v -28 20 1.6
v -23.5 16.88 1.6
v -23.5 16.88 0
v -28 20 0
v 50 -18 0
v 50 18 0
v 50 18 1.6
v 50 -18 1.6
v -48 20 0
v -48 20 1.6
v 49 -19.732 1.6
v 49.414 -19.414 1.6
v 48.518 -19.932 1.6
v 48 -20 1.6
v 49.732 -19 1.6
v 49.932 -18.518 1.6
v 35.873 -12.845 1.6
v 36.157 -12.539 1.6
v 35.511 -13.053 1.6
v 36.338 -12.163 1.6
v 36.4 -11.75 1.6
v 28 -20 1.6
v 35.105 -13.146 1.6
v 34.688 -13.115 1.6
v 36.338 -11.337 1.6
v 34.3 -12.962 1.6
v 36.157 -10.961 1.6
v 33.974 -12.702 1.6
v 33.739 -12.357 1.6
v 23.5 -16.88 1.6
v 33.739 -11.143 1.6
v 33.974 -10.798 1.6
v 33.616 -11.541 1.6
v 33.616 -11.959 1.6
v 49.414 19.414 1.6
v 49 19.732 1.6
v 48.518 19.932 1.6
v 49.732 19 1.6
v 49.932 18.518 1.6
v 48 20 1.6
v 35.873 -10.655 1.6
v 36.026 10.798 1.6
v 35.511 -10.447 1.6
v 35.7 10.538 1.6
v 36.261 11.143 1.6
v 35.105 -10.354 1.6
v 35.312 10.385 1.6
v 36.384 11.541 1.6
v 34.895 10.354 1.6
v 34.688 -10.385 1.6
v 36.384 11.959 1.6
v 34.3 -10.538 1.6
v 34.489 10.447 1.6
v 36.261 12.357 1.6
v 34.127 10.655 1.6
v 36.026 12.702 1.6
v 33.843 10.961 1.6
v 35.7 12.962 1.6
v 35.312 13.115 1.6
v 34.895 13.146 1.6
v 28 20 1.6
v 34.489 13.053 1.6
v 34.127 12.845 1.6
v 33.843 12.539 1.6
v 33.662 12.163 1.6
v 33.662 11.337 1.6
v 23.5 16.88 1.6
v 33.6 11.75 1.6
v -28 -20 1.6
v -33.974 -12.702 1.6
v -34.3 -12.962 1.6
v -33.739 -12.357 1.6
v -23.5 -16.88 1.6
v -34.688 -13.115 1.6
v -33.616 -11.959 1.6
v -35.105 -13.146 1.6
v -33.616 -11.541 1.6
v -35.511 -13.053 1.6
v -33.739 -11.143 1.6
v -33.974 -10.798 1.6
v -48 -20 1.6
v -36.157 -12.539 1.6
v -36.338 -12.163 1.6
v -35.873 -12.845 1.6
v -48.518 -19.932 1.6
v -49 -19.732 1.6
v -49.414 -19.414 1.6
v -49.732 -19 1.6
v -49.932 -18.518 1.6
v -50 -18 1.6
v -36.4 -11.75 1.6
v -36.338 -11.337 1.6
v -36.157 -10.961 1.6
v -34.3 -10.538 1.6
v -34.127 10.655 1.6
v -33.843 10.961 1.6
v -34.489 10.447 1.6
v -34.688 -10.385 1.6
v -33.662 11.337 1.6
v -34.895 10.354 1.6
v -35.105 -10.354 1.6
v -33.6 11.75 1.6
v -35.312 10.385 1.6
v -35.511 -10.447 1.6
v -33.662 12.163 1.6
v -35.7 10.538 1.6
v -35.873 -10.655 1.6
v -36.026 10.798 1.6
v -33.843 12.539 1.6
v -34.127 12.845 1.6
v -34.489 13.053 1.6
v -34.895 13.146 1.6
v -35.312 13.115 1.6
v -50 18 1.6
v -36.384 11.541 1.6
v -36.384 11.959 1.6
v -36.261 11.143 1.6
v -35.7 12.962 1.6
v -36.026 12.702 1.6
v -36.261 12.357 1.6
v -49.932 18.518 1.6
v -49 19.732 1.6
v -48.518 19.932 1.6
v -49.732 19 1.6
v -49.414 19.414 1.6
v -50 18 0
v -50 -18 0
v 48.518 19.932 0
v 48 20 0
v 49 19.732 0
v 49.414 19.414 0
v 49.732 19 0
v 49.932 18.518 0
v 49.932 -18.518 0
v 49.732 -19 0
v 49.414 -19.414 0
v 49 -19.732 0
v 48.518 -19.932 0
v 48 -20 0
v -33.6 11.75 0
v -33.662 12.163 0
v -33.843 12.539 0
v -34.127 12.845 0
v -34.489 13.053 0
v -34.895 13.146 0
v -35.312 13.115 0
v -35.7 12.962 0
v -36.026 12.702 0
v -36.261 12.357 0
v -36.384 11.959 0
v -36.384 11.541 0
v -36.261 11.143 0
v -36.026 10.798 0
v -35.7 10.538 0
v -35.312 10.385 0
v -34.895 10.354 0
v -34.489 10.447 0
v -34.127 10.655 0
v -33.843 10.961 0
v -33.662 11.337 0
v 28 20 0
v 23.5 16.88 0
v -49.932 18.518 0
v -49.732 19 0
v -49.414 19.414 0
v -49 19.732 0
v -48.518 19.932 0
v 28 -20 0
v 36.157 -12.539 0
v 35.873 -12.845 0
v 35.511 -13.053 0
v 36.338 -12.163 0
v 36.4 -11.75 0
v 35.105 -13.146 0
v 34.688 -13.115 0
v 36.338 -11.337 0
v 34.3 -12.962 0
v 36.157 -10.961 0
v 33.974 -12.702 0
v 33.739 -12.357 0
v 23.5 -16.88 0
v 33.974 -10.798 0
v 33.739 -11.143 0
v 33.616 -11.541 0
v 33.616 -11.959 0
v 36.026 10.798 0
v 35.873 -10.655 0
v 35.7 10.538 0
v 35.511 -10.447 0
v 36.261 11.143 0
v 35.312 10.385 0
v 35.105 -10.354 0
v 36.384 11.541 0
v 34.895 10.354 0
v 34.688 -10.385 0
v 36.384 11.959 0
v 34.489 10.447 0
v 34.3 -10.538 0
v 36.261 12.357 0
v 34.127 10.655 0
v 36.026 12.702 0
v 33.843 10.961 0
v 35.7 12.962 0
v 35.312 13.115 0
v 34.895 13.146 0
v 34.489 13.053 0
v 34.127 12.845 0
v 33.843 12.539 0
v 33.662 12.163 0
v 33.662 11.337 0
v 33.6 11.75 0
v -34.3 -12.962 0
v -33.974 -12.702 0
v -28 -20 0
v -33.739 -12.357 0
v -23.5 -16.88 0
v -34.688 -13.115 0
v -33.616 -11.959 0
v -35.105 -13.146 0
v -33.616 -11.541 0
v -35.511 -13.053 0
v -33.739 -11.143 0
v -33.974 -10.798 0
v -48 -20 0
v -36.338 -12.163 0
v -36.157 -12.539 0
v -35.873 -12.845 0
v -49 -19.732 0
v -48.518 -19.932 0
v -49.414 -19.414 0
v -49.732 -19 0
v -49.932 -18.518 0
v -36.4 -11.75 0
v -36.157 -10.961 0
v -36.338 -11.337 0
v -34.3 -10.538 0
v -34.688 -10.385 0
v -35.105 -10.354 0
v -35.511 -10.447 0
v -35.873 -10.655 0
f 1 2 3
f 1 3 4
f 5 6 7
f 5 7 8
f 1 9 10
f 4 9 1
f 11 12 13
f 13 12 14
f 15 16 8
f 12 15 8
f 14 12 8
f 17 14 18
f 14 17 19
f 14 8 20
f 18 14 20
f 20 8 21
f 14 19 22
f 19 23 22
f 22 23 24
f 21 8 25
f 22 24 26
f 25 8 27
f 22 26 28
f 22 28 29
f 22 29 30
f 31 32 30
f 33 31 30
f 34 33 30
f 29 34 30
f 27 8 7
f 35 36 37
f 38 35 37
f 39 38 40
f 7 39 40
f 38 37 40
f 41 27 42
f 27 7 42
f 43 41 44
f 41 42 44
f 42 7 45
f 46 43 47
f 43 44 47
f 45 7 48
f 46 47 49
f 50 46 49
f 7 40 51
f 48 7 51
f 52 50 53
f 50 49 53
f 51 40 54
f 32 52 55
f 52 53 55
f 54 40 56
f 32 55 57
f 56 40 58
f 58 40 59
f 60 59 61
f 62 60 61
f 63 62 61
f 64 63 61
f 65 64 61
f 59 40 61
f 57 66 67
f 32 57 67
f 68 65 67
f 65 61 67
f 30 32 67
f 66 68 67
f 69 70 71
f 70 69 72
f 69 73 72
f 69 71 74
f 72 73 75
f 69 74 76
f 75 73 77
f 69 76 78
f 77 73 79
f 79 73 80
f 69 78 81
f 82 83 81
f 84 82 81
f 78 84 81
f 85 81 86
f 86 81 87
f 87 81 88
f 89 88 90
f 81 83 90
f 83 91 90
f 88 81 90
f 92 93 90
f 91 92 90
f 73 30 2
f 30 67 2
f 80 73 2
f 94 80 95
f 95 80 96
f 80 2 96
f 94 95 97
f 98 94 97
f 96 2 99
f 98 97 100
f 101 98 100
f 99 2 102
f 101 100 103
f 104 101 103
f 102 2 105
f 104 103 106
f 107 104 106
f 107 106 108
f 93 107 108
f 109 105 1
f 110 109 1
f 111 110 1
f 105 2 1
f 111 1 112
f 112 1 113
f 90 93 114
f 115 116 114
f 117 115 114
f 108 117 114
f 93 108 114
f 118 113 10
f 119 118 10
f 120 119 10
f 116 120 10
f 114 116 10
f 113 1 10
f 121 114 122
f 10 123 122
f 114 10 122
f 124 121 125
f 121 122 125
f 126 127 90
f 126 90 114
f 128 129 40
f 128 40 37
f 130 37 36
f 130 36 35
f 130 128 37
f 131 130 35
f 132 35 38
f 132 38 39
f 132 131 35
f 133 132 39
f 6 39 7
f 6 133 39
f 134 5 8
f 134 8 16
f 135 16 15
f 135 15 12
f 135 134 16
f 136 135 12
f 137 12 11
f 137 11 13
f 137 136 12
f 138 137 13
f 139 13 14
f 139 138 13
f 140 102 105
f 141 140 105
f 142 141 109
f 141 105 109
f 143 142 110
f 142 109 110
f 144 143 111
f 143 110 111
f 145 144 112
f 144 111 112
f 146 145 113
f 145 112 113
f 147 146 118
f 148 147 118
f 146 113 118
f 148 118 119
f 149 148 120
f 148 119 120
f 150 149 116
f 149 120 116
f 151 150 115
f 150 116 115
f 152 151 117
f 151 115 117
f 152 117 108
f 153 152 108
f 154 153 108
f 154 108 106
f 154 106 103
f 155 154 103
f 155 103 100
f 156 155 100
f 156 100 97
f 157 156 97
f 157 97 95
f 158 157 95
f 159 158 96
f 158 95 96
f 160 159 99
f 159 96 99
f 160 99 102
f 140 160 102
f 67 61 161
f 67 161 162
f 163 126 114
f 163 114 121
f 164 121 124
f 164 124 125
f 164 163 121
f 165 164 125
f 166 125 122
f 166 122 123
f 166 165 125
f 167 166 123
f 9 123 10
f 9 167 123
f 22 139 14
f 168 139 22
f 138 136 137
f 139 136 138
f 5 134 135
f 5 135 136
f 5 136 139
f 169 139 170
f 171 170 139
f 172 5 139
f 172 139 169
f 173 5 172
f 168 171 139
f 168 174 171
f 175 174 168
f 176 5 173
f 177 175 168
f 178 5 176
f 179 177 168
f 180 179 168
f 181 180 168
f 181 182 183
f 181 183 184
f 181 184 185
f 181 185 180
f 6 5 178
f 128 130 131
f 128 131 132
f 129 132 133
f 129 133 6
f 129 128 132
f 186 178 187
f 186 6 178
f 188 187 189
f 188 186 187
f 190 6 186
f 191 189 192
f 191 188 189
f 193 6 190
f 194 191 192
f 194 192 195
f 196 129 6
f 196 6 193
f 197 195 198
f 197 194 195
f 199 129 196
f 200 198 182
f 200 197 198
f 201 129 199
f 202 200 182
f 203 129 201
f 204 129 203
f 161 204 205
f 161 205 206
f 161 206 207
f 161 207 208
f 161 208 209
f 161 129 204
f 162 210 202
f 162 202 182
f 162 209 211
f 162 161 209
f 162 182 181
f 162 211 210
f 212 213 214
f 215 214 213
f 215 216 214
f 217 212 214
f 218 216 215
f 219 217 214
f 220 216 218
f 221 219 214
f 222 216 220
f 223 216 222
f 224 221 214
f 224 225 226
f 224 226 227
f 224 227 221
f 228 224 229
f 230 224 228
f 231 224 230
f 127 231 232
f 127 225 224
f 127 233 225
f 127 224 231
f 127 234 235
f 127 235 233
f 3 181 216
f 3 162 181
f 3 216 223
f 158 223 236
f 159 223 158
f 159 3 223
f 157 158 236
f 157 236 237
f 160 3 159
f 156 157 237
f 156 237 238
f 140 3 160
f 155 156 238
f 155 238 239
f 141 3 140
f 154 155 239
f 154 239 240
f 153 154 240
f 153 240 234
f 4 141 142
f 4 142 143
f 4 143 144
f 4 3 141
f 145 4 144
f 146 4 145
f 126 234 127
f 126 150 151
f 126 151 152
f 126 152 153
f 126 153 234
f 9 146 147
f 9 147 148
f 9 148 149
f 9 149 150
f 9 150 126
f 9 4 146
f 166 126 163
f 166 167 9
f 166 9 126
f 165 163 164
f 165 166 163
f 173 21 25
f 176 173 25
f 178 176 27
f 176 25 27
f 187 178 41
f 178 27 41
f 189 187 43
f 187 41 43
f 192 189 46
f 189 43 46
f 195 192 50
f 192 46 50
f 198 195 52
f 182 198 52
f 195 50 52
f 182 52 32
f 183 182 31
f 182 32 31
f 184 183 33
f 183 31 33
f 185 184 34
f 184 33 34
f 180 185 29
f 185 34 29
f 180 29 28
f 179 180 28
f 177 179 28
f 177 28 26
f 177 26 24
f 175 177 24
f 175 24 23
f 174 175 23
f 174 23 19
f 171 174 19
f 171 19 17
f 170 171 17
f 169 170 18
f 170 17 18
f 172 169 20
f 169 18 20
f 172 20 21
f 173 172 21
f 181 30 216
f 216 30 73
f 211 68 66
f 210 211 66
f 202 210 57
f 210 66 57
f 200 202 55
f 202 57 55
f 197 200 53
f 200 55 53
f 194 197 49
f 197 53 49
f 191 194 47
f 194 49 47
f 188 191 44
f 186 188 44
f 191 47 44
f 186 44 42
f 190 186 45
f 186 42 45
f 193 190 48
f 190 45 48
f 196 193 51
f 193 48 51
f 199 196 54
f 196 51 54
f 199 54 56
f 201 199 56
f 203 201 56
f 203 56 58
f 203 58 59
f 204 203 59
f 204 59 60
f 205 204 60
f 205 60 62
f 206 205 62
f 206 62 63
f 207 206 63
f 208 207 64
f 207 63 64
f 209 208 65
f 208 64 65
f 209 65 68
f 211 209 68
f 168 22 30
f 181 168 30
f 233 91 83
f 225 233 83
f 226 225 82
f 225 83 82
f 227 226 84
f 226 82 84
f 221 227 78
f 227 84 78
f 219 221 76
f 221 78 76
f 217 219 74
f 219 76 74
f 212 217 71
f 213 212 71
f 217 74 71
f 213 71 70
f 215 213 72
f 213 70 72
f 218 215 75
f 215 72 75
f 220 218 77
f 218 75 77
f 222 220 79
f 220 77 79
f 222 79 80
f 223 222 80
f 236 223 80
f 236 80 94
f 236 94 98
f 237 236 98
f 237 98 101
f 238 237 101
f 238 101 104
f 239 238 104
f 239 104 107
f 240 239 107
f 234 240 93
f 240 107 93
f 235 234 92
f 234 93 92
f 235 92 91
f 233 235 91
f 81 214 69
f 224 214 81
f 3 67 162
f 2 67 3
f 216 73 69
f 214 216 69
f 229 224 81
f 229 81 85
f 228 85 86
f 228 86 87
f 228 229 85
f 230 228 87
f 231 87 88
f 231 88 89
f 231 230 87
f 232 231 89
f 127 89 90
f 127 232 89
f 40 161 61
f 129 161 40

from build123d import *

# Parameters (mm, degrees)
BOSS_EXTRUDE1_DEPTH = 1.6
SKETCH2_R           = 1.4
CUT_EXTRUDE1_DEPTH  = 1.6


with BuildPart() as part:
    # Sketch1 → Boss-Extrude1 (new body)
    with BuildSketch(Plane.XY):
        with BuildLine():
            Line((48, -20), (-48, -20))
            ThreePointArc((-48, -20), (-49.414213562, -19.414213562), (-50, -18))
            Line((-50, -18), (-50, 18))
            ThreePointArc((-50, 18), (-49.414213562, 19.414213562), (-48, 20))
            Line((-48, 20), (48, 20))
            ThreePointArc((48, 20), (49.414213562, 19.414213562), (50, 18))
            Line((50, 18), (50, -18))
            ThreePointArc((50, -18), (49.414213562, -19.414213562), (48, -20))
        make_face()
    extrude(amount=BOSS_EXTRUDE1_DEPTH)

    # Sketch2 → Cut-Extrude1 (cut)
    with BuildSketch(Plane.XY.offset(1.6)):
        with Locations((-35, 11.75)):
            Circle(SKETCH2_R)
        with Locations(Location((-35, -11.75, 0), (0, 0, 180))):
            Circle(SKETCH2_R)
        with Locations((35, -11.75)):
            Circle(SKETCH2_R)
        with Locations(Location((35, 11.75, 0), (0, 0, 180))):
            Circle(SKETCH2_R)
        Polygon((23.5, 16.88), (-23.5, 16.88), (-28, 20), (28, 20), align=None)
        Polygon((28, -20), (23.5, -16.88), (-23.5, -16.88), (-28, -20), align=None)
    extrude(amount=-CUT_EXTRUDE1_DEPTH, mode=Mode.SUBTRACT)


solid = part.part
